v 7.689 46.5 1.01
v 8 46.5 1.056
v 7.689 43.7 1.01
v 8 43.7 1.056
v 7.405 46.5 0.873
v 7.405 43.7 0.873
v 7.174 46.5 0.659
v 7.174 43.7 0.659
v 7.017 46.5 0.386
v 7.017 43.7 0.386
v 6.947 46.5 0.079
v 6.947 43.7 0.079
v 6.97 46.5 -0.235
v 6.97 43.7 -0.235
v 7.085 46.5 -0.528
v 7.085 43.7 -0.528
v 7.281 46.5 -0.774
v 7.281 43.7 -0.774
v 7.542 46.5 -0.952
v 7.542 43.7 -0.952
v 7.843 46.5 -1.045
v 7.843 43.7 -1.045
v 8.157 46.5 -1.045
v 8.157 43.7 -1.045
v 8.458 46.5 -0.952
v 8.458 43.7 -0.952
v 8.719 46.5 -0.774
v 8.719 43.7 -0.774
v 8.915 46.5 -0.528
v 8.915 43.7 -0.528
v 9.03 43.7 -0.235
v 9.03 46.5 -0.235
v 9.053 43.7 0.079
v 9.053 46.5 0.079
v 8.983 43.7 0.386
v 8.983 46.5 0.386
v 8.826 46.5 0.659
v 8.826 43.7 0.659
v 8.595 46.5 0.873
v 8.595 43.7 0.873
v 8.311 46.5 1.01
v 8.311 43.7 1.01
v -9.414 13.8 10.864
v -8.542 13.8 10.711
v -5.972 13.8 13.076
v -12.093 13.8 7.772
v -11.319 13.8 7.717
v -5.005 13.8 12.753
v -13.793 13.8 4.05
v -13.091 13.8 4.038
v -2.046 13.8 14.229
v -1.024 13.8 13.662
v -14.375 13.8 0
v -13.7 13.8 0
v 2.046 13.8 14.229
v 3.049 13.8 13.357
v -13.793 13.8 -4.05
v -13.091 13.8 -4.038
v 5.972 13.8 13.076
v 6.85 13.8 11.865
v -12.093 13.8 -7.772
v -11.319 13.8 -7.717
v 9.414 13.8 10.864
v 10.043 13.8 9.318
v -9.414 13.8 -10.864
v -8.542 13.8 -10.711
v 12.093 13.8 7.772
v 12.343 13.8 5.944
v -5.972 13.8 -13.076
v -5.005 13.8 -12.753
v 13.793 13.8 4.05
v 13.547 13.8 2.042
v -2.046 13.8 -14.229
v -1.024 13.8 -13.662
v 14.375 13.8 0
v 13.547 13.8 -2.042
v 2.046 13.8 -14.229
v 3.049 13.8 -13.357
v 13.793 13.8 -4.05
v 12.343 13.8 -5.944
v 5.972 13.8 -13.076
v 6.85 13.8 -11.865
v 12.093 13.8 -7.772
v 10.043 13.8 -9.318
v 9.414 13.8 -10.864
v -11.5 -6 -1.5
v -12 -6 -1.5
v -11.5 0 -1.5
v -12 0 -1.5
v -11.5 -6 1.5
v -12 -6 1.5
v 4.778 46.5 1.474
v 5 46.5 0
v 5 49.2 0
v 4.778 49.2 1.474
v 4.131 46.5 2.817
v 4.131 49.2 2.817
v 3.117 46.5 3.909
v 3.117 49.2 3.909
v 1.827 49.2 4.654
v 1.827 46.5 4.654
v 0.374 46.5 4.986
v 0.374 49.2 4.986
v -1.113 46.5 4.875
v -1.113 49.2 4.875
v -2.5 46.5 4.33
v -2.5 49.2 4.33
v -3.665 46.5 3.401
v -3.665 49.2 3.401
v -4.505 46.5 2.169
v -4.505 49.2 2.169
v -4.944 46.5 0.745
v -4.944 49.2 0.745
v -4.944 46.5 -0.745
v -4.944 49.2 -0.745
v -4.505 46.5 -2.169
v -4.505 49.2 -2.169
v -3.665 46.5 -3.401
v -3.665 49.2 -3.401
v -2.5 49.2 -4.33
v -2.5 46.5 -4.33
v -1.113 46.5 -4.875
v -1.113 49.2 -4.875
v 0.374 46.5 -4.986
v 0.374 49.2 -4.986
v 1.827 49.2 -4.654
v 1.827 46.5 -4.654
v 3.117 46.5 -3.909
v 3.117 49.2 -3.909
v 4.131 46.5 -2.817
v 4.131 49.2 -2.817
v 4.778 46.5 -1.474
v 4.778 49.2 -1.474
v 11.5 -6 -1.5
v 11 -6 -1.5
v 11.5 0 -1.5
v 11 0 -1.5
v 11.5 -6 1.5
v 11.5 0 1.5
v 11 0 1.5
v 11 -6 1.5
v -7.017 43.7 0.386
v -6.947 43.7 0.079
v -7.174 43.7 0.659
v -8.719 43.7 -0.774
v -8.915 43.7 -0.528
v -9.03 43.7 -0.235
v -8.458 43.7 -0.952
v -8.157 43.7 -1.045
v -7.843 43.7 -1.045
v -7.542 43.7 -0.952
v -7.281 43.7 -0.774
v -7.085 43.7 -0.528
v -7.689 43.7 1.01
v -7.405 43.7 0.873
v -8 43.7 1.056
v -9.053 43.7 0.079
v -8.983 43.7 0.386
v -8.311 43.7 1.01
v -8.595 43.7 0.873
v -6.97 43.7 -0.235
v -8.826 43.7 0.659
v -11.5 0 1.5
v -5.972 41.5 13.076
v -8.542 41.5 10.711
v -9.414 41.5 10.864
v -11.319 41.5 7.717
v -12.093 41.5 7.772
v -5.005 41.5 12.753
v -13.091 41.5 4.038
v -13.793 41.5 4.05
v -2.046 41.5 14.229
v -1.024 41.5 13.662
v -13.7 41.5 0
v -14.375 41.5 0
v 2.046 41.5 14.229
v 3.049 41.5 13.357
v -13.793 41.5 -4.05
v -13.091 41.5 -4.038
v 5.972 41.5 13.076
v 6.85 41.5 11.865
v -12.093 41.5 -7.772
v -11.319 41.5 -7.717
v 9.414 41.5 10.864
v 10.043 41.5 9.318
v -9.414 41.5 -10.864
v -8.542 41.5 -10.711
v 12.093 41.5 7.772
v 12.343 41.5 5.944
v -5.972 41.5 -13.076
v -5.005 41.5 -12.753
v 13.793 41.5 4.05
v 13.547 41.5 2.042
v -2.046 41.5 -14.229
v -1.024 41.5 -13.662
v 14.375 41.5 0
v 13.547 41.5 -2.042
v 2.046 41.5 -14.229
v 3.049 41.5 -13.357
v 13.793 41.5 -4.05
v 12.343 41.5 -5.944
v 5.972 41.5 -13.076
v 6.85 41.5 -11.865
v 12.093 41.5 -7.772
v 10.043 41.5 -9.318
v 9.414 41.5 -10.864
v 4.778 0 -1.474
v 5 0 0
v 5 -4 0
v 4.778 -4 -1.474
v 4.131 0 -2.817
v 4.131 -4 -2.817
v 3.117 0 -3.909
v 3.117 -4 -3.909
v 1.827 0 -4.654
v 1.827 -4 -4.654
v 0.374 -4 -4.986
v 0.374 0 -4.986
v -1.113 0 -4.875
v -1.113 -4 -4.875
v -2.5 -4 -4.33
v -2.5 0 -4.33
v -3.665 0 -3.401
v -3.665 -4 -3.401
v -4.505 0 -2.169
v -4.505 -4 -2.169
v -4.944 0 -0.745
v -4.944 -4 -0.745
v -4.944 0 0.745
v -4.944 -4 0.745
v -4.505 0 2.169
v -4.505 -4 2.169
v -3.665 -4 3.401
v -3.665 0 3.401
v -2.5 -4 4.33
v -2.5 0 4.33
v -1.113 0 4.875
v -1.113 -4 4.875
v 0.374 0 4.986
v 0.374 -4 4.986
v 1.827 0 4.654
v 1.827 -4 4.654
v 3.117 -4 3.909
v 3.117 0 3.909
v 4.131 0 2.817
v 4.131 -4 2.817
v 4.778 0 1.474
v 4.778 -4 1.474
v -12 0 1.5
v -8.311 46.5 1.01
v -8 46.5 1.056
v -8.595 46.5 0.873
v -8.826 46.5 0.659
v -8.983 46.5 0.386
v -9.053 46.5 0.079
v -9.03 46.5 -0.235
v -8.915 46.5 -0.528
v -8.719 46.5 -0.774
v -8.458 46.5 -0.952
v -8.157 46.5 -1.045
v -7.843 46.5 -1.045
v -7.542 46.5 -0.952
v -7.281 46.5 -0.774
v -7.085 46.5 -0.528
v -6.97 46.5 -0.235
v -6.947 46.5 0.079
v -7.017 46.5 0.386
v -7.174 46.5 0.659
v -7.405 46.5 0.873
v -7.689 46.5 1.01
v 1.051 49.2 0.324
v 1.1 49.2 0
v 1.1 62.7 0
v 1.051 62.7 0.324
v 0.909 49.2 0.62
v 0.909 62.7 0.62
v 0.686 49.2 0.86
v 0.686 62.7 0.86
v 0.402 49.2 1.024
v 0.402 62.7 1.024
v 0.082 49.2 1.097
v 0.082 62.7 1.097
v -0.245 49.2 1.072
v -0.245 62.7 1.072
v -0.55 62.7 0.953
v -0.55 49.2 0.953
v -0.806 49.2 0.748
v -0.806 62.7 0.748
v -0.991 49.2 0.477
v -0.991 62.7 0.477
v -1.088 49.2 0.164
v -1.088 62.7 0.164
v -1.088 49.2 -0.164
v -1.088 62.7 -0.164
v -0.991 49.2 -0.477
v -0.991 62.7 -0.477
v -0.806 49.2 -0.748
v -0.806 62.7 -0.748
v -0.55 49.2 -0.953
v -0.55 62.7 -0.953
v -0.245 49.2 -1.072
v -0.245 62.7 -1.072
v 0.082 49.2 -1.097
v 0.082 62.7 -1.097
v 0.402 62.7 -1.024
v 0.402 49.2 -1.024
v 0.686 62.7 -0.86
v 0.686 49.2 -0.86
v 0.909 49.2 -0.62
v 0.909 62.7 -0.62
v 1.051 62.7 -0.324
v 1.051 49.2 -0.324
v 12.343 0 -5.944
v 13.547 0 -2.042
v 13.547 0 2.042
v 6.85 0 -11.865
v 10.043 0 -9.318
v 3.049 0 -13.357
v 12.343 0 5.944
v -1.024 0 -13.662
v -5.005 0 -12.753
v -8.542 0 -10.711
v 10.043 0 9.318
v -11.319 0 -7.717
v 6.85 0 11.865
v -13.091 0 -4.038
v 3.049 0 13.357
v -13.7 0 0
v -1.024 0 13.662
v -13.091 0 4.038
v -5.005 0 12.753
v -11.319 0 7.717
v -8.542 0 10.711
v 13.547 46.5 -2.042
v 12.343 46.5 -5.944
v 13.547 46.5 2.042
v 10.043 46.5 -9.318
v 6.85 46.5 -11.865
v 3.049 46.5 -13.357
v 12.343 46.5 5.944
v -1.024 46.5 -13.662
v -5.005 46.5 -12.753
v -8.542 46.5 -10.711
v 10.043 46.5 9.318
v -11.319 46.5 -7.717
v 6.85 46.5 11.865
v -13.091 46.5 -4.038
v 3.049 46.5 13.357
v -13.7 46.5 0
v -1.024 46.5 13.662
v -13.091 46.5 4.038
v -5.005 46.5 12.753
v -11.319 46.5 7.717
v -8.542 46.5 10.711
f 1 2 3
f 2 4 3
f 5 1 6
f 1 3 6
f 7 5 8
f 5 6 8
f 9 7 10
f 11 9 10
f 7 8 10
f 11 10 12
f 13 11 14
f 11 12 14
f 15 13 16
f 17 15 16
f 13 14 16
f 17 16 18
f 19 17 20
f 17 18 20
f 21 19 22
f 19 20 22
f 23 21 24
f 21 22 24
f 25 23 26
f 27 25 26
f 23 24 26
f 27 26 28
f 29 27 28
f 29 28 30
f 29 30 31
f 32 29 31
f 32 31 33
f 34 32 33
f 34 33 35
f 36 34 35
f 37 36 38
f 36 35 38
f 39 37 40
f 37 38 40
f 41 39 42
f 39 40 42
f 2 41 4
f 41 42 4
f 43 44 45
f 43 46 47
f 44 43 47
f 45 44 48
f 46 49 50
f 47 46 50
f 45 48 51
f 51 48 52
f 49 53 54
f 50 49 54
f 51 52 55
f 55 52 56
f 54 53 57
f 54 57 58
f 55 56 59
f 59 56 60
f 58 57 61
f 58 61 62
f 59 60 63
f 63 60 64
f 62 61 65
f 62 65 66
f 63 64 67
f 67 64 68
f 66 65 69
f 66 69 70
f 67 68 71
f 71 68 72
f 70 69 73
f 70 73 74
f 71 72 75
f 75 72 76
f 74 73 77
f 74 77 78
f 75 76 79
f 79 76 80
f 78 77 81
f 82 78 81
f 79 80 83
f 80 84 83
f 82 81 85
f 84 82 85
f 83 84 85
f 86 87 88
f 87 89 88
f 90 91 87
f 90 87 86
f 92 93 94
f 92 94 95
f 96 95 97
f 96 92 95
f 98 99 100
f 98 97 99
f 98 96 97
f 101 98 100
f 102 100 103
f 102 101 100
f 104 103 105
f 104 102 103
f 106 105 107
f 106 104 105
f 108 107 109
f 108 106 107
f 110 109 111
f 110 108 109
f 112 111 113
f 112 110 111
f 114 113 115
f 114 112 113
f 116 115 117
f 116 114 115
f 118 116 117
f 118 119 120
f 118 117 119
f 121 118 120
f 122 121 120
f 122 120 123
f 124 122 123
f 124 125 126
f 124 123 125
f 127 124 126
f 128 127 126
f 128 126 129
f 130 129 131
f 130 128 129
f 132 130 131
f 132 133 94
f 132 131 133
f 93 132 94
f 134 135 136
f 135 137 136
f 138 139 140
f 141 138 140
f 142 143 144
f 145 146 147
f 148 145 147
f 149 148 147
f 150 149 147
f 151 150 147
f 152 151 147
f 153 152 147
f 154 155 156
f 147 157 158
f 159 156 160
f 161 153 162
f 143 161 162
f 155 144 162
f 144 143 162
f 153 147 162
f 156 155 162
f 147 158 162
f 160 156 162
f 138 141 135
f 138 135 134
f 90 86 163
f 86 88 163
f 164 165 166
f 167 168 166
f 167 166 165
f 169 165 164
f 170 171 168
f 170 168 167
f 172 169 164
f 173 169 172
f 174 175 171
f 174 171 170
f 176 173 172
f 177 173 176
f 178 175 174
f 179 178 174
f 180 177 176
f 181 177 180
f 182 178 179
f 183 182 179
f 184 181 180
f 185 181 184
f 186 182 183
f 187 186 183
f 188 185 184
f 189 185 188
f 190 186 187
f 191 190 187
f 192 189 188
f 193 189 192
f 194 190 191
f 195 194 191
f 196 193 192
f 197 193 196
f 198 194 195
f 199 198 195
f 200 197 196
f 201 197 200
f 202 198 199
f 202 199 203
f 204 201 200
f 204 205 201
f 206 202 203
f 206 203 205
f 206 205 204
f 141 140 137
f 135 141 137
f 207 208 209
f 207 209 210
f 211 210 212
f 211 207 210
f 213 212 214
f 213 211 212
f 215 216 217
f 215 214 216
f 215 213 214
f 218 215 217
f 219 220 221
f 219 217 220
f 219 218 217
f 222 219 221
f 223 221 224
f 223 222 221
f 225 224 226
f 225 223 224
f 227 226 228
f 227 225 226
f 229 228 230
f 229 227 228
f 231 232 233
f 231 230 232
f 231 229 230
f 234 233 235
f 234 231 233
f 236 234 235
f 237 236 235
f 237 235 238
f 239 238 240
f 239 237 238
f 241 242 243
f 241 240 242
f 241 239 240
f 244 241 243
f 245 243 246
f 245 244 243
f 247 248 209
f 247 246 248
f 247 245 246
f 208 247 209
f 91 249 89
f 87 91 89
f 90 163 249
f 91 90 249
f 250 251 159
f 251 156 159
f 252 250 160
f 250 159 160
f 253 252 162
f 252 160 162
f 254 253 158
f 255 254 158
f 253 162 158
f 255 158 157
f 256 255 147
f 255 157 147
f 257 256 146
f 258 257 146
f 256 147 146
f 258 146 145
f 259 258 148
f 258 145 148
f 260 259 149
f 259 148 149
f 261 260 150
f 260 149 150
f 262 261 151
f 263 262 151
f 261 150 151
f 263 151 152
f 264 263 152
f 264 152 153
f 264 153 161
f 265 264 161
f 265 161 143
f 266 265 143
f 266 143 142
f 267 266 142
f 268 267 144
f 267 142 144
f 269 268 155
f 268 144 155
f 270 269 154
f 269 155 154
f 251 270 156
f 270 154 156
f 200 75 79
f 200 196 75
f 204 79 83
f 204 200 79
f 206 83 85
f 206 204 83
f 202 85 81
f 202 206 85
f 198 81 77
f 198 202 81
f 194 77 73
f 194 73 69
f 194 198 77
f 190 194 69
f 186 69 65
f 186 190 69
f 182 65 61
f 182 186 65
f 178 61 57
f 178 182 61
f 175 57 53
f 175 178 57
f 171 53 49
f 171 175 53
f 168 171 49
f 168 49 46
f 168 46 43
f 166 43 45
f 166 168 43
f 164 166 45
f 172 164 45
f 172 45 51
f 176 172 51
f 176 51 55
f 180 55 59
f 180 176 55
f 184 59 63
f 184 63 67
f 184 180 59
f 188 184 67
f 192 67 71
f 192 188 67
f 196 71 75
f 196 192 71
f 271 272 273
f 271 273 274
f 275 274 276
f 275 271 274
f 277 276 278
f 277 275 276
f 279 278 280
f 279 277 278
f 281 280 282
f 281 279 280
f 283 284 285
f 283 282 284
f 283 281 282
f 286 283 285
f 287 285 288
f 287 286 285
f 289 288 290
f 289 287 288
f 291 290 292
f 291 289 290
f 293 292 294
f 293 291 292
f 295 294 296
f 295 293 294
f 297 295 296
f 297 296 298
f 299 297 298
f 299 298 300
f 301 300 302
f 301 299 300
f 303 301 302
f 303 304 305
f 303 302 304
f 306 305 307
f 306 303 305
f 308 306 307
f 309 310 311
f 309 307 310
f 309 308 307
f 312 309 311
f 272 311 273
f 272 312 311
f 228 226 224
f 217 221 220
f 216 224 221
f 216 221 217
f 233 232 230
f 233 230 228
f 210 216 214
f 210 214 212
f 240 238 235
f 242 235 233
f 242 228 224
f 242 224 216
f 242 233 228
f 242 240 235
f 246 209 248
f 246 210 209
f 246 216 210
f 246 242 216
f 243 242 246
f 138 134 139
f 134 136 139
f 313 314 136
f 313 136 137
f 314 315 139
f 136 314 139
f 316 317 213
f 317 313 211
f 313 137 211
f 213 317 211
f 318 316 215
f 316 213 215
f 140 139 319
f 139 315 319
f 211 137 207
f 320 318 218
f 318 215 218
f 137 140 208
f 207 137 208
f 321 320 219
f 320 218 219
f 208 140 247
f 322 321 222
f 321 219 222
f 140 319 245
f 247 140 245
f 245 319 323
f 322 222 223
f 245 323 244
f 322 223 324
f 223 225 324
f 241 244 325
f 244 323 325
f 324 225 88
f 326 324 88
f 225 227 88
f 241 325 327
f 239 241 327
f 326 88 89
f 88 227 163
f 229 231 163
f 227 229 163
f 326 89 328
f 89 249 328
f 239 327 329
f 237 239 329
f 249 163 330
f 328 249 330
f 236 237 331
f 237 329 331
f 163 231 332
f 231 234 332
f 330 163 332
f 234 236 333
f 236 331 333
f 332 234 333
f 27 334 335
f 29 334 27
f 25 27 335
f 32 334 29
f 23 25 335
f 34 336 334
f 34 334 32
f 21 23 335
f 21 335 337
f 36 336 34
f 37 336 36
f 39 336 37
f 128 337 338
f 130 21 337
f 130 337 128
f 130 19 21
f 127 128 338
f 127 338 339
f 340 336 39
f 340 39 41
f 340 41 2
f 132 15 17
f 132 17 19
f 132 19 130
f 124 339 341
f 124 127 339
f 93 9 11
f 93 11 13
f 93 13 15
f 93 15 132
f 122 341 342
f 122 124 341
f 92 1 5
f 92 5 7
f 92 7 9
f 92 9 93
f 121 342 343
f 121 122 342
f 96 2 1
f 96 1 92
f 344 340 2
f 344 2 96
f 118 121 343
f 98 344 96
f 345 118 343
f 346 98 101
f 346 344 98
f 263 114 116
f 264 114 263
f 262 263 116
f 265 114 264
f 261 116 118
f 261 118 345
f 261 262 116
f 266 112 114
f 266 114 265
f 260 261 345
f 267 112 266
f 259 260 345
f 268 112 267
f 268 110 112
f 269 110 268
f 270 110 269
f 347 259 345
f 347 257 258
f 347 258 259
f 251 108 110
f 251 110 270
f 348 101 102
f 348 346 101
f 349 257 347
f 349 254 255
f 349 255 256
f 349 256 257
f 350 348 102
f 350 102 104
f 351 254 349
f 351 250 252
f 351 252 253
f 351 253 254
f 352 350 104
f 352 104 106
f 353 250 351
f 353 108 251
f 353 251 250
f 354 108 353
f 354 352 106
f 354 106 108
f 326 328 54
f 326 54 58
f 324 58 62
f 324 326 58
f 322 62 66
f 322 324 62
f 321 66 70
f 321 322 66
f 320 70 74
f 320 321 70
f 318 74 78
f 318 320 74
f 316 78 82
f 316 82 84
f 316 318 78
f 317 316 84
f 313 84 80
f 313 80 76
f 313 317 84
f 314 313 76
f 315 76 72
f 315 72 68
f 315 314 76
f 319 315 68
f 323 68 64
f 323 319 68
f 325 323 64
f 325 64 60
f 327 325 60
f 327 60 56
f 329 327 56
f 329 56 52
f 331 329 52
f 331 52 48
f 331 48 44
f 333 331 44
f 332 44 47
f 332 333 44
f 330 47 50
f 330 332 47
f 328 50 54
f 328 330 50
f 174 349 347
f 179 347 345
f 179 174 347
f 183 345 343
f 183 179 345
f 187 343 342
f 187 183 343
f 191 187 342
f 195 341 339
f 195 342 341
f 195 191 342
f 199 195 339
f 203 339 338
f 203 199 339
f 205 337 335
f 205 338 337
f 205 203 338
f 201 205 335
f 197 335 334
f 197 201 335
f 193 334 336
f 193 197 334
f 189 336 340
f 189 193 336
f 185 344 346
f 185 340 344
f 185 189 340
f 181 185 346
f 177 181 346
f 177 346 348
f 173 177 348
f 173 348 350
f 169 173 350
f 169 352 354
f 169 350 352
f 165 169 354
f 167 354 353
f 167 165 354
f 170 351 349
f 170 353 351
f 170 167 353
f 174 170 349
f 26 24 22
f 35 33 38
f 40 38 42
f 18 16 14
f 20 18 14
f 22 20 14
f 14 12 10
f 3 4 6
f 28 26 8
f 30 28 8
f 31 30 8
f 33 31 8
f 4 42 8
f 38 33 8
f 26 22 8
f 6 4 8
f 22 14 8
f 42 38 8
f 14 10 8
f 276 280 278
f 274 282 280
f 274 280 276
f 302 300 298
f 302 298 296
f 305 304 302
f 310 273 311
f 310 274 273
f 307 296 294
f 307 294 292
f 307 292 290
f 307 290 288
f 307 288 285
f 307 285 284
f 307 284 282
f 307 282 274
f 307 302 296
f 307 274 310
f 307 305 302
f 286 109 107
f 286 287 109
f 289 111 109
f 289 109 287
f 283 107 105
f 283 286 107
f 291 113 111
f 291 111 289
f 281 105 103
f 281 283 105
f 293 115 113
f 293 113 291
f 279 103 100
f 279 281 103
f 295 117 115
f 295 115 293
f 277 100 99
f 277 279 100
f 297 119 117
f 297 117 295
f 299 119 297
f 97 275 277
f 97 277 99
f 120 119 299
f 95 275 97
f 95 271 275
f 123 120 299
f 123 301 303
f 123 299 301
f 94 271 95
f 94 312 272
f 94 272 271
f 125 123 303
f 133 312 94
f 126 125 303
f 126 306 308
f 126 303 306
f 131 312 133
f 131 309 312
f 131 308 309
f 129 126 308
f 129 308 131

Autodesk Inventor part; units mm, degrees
ref_plane "YZ Plane" through (0, 0, 0) normal (1, 0, 0) x (0, 1, 0)
sketch "Sketch1" plane through (0, 0, 0) normal (0, 1, 0) x (-1, 0, 0)
  circle A0 centre (0, 0) radius 13.7
  dimension "d0" = 27.4
extrude "Extrusion1" add sketch "Sketch1" along normal blind 46.5
sketch "Sketch2" plane through (0, 46.5, 0) normal (0, 1, 0) x (1, 0, 0)
  circle A0 centre (0, 0) radius 13.7 projected
  circle A1 centre (0, 0) radius 5
  dimension "d3" = 10
extrude "Extrusion2" add sketch "Sketch2" along normal blind 2.7 contours A1
sketch "Sketch3" plane through (0, 46.5, 0) normal (0, 1, 0) x (1, 0, 0)
  circle A0 centre (0, 0) radius 5 projected
  circle A1 centre (0, 0) radius 5 projected
  circle A2 centre (0, 0) radius 13.7 projected
  circle A3 centre (0, 0) radius 13.7 projected
  line L0 (-13.7, 0) -> (13.7, 0)
  point P0 (-8, 0)
  point P1 (8, 0)
  dimension "d6" = 16
  dimension "d7" = 5.7
  dimension "d8" = 5.7
hole "Hole1" at (-8, 46.5, 0) at (8, 46.5, 0) direction (0, -1, 0) diameter 2.1129 depth 2.8 thread size "M2.6x0.45" class "6H" standard "ISO Metric profile"
ref_plane "Work Plane1" through (0, 41.5, 0) normal (0, 1, 0) x (1, 0, 0)
sketch "Sketch4" plane through (0, 41.5, 0) normal (0, 1, 0) x (1, 0, 0)
  circle A0 centre (0, 0) radius 14.375
  dimension "d17" = 28.75
extrude "Extrusion3" add sketch "Sketch4" against normal blind 27.7
sketch "Sketch5" plane through (0, 0, 0) normal (0, -1, 0) x (1, 0, 0)
  circle A0 centre (0, 0) radius 5
  dimension "d20" = 10
extrude "Extrusion4" add sketch "Sketch5" along normal blind 4
sketch "Sketch6" plane through (0, 0, 0) normal (0, -1, 0) x (1, 0, 0)
  circle A0 centre (0, 0) radius 5 projected
  circle A1 centre (0, 0) radius 5 projected
  circle A2 centre (0, 0) radius 13.7 projected
  circle A3 centre (0, 0) radius 13.7 projected
  line L0 (13.7, 0) -> (-13.7, 0)
  line L1 (-11.5, 1.5) -> (-12, 1.5)
  line L2 (-12, 1.5) -> (-12, -1.5)
  line L3 (-12, -1.5) -> (-11.5, -1.5)
  line L4 (-11.5, -1.5) -> (-11.5, 1.5)
  line L5 (11.5, 1.5) -> (11, 1.5)
  line L6 (11, 1.5) -> (11, -1.5)
  line L7 (11, -1.5) -> (11.5, -1.5)
  line L8 (11.5, -1.5) -> (11.5, 1.5)
  dimension "d23" = 22.5
  dimension "d24" = 0.5
  dimension "d25" = 0.5
  dimension "d26" = 11.5
  dimension "d27" = 11.5
  dimension "d28" = 3
  dimension "d29" = 3
  dimension "d30" = 1.5
  dimension "d31" = 1.5
extrude "Extrusion5" add sketch "Sketch6" along normal blind 6 contours L6 L5 L8 L0 | L0 L8 L7 L6 | L4 L3 L2 L0 | L0 L2 L1 L4
sketch "Sketch7" plane through (0, 49.2, 0) normal (0, 1, 0) x (1, 0, 0)
  circle A0 centre (0, 0) radius 1.1
  dimension "d34" = 2.2
extrude "Extrusion6" add sketch "Sketch7" along normal blind 13.5
ref_plane "Work Plane2" through (0, 50.2, 0) normal (0, 1, 0) x (1, 0, 0)
equation "\"d7\" = d8"
equation "\"d26\" = d27"
equation "\"d30\" = d31"
equation "\"d41\" = d42"
properties part number "rs390" material "Steel, Mild"
